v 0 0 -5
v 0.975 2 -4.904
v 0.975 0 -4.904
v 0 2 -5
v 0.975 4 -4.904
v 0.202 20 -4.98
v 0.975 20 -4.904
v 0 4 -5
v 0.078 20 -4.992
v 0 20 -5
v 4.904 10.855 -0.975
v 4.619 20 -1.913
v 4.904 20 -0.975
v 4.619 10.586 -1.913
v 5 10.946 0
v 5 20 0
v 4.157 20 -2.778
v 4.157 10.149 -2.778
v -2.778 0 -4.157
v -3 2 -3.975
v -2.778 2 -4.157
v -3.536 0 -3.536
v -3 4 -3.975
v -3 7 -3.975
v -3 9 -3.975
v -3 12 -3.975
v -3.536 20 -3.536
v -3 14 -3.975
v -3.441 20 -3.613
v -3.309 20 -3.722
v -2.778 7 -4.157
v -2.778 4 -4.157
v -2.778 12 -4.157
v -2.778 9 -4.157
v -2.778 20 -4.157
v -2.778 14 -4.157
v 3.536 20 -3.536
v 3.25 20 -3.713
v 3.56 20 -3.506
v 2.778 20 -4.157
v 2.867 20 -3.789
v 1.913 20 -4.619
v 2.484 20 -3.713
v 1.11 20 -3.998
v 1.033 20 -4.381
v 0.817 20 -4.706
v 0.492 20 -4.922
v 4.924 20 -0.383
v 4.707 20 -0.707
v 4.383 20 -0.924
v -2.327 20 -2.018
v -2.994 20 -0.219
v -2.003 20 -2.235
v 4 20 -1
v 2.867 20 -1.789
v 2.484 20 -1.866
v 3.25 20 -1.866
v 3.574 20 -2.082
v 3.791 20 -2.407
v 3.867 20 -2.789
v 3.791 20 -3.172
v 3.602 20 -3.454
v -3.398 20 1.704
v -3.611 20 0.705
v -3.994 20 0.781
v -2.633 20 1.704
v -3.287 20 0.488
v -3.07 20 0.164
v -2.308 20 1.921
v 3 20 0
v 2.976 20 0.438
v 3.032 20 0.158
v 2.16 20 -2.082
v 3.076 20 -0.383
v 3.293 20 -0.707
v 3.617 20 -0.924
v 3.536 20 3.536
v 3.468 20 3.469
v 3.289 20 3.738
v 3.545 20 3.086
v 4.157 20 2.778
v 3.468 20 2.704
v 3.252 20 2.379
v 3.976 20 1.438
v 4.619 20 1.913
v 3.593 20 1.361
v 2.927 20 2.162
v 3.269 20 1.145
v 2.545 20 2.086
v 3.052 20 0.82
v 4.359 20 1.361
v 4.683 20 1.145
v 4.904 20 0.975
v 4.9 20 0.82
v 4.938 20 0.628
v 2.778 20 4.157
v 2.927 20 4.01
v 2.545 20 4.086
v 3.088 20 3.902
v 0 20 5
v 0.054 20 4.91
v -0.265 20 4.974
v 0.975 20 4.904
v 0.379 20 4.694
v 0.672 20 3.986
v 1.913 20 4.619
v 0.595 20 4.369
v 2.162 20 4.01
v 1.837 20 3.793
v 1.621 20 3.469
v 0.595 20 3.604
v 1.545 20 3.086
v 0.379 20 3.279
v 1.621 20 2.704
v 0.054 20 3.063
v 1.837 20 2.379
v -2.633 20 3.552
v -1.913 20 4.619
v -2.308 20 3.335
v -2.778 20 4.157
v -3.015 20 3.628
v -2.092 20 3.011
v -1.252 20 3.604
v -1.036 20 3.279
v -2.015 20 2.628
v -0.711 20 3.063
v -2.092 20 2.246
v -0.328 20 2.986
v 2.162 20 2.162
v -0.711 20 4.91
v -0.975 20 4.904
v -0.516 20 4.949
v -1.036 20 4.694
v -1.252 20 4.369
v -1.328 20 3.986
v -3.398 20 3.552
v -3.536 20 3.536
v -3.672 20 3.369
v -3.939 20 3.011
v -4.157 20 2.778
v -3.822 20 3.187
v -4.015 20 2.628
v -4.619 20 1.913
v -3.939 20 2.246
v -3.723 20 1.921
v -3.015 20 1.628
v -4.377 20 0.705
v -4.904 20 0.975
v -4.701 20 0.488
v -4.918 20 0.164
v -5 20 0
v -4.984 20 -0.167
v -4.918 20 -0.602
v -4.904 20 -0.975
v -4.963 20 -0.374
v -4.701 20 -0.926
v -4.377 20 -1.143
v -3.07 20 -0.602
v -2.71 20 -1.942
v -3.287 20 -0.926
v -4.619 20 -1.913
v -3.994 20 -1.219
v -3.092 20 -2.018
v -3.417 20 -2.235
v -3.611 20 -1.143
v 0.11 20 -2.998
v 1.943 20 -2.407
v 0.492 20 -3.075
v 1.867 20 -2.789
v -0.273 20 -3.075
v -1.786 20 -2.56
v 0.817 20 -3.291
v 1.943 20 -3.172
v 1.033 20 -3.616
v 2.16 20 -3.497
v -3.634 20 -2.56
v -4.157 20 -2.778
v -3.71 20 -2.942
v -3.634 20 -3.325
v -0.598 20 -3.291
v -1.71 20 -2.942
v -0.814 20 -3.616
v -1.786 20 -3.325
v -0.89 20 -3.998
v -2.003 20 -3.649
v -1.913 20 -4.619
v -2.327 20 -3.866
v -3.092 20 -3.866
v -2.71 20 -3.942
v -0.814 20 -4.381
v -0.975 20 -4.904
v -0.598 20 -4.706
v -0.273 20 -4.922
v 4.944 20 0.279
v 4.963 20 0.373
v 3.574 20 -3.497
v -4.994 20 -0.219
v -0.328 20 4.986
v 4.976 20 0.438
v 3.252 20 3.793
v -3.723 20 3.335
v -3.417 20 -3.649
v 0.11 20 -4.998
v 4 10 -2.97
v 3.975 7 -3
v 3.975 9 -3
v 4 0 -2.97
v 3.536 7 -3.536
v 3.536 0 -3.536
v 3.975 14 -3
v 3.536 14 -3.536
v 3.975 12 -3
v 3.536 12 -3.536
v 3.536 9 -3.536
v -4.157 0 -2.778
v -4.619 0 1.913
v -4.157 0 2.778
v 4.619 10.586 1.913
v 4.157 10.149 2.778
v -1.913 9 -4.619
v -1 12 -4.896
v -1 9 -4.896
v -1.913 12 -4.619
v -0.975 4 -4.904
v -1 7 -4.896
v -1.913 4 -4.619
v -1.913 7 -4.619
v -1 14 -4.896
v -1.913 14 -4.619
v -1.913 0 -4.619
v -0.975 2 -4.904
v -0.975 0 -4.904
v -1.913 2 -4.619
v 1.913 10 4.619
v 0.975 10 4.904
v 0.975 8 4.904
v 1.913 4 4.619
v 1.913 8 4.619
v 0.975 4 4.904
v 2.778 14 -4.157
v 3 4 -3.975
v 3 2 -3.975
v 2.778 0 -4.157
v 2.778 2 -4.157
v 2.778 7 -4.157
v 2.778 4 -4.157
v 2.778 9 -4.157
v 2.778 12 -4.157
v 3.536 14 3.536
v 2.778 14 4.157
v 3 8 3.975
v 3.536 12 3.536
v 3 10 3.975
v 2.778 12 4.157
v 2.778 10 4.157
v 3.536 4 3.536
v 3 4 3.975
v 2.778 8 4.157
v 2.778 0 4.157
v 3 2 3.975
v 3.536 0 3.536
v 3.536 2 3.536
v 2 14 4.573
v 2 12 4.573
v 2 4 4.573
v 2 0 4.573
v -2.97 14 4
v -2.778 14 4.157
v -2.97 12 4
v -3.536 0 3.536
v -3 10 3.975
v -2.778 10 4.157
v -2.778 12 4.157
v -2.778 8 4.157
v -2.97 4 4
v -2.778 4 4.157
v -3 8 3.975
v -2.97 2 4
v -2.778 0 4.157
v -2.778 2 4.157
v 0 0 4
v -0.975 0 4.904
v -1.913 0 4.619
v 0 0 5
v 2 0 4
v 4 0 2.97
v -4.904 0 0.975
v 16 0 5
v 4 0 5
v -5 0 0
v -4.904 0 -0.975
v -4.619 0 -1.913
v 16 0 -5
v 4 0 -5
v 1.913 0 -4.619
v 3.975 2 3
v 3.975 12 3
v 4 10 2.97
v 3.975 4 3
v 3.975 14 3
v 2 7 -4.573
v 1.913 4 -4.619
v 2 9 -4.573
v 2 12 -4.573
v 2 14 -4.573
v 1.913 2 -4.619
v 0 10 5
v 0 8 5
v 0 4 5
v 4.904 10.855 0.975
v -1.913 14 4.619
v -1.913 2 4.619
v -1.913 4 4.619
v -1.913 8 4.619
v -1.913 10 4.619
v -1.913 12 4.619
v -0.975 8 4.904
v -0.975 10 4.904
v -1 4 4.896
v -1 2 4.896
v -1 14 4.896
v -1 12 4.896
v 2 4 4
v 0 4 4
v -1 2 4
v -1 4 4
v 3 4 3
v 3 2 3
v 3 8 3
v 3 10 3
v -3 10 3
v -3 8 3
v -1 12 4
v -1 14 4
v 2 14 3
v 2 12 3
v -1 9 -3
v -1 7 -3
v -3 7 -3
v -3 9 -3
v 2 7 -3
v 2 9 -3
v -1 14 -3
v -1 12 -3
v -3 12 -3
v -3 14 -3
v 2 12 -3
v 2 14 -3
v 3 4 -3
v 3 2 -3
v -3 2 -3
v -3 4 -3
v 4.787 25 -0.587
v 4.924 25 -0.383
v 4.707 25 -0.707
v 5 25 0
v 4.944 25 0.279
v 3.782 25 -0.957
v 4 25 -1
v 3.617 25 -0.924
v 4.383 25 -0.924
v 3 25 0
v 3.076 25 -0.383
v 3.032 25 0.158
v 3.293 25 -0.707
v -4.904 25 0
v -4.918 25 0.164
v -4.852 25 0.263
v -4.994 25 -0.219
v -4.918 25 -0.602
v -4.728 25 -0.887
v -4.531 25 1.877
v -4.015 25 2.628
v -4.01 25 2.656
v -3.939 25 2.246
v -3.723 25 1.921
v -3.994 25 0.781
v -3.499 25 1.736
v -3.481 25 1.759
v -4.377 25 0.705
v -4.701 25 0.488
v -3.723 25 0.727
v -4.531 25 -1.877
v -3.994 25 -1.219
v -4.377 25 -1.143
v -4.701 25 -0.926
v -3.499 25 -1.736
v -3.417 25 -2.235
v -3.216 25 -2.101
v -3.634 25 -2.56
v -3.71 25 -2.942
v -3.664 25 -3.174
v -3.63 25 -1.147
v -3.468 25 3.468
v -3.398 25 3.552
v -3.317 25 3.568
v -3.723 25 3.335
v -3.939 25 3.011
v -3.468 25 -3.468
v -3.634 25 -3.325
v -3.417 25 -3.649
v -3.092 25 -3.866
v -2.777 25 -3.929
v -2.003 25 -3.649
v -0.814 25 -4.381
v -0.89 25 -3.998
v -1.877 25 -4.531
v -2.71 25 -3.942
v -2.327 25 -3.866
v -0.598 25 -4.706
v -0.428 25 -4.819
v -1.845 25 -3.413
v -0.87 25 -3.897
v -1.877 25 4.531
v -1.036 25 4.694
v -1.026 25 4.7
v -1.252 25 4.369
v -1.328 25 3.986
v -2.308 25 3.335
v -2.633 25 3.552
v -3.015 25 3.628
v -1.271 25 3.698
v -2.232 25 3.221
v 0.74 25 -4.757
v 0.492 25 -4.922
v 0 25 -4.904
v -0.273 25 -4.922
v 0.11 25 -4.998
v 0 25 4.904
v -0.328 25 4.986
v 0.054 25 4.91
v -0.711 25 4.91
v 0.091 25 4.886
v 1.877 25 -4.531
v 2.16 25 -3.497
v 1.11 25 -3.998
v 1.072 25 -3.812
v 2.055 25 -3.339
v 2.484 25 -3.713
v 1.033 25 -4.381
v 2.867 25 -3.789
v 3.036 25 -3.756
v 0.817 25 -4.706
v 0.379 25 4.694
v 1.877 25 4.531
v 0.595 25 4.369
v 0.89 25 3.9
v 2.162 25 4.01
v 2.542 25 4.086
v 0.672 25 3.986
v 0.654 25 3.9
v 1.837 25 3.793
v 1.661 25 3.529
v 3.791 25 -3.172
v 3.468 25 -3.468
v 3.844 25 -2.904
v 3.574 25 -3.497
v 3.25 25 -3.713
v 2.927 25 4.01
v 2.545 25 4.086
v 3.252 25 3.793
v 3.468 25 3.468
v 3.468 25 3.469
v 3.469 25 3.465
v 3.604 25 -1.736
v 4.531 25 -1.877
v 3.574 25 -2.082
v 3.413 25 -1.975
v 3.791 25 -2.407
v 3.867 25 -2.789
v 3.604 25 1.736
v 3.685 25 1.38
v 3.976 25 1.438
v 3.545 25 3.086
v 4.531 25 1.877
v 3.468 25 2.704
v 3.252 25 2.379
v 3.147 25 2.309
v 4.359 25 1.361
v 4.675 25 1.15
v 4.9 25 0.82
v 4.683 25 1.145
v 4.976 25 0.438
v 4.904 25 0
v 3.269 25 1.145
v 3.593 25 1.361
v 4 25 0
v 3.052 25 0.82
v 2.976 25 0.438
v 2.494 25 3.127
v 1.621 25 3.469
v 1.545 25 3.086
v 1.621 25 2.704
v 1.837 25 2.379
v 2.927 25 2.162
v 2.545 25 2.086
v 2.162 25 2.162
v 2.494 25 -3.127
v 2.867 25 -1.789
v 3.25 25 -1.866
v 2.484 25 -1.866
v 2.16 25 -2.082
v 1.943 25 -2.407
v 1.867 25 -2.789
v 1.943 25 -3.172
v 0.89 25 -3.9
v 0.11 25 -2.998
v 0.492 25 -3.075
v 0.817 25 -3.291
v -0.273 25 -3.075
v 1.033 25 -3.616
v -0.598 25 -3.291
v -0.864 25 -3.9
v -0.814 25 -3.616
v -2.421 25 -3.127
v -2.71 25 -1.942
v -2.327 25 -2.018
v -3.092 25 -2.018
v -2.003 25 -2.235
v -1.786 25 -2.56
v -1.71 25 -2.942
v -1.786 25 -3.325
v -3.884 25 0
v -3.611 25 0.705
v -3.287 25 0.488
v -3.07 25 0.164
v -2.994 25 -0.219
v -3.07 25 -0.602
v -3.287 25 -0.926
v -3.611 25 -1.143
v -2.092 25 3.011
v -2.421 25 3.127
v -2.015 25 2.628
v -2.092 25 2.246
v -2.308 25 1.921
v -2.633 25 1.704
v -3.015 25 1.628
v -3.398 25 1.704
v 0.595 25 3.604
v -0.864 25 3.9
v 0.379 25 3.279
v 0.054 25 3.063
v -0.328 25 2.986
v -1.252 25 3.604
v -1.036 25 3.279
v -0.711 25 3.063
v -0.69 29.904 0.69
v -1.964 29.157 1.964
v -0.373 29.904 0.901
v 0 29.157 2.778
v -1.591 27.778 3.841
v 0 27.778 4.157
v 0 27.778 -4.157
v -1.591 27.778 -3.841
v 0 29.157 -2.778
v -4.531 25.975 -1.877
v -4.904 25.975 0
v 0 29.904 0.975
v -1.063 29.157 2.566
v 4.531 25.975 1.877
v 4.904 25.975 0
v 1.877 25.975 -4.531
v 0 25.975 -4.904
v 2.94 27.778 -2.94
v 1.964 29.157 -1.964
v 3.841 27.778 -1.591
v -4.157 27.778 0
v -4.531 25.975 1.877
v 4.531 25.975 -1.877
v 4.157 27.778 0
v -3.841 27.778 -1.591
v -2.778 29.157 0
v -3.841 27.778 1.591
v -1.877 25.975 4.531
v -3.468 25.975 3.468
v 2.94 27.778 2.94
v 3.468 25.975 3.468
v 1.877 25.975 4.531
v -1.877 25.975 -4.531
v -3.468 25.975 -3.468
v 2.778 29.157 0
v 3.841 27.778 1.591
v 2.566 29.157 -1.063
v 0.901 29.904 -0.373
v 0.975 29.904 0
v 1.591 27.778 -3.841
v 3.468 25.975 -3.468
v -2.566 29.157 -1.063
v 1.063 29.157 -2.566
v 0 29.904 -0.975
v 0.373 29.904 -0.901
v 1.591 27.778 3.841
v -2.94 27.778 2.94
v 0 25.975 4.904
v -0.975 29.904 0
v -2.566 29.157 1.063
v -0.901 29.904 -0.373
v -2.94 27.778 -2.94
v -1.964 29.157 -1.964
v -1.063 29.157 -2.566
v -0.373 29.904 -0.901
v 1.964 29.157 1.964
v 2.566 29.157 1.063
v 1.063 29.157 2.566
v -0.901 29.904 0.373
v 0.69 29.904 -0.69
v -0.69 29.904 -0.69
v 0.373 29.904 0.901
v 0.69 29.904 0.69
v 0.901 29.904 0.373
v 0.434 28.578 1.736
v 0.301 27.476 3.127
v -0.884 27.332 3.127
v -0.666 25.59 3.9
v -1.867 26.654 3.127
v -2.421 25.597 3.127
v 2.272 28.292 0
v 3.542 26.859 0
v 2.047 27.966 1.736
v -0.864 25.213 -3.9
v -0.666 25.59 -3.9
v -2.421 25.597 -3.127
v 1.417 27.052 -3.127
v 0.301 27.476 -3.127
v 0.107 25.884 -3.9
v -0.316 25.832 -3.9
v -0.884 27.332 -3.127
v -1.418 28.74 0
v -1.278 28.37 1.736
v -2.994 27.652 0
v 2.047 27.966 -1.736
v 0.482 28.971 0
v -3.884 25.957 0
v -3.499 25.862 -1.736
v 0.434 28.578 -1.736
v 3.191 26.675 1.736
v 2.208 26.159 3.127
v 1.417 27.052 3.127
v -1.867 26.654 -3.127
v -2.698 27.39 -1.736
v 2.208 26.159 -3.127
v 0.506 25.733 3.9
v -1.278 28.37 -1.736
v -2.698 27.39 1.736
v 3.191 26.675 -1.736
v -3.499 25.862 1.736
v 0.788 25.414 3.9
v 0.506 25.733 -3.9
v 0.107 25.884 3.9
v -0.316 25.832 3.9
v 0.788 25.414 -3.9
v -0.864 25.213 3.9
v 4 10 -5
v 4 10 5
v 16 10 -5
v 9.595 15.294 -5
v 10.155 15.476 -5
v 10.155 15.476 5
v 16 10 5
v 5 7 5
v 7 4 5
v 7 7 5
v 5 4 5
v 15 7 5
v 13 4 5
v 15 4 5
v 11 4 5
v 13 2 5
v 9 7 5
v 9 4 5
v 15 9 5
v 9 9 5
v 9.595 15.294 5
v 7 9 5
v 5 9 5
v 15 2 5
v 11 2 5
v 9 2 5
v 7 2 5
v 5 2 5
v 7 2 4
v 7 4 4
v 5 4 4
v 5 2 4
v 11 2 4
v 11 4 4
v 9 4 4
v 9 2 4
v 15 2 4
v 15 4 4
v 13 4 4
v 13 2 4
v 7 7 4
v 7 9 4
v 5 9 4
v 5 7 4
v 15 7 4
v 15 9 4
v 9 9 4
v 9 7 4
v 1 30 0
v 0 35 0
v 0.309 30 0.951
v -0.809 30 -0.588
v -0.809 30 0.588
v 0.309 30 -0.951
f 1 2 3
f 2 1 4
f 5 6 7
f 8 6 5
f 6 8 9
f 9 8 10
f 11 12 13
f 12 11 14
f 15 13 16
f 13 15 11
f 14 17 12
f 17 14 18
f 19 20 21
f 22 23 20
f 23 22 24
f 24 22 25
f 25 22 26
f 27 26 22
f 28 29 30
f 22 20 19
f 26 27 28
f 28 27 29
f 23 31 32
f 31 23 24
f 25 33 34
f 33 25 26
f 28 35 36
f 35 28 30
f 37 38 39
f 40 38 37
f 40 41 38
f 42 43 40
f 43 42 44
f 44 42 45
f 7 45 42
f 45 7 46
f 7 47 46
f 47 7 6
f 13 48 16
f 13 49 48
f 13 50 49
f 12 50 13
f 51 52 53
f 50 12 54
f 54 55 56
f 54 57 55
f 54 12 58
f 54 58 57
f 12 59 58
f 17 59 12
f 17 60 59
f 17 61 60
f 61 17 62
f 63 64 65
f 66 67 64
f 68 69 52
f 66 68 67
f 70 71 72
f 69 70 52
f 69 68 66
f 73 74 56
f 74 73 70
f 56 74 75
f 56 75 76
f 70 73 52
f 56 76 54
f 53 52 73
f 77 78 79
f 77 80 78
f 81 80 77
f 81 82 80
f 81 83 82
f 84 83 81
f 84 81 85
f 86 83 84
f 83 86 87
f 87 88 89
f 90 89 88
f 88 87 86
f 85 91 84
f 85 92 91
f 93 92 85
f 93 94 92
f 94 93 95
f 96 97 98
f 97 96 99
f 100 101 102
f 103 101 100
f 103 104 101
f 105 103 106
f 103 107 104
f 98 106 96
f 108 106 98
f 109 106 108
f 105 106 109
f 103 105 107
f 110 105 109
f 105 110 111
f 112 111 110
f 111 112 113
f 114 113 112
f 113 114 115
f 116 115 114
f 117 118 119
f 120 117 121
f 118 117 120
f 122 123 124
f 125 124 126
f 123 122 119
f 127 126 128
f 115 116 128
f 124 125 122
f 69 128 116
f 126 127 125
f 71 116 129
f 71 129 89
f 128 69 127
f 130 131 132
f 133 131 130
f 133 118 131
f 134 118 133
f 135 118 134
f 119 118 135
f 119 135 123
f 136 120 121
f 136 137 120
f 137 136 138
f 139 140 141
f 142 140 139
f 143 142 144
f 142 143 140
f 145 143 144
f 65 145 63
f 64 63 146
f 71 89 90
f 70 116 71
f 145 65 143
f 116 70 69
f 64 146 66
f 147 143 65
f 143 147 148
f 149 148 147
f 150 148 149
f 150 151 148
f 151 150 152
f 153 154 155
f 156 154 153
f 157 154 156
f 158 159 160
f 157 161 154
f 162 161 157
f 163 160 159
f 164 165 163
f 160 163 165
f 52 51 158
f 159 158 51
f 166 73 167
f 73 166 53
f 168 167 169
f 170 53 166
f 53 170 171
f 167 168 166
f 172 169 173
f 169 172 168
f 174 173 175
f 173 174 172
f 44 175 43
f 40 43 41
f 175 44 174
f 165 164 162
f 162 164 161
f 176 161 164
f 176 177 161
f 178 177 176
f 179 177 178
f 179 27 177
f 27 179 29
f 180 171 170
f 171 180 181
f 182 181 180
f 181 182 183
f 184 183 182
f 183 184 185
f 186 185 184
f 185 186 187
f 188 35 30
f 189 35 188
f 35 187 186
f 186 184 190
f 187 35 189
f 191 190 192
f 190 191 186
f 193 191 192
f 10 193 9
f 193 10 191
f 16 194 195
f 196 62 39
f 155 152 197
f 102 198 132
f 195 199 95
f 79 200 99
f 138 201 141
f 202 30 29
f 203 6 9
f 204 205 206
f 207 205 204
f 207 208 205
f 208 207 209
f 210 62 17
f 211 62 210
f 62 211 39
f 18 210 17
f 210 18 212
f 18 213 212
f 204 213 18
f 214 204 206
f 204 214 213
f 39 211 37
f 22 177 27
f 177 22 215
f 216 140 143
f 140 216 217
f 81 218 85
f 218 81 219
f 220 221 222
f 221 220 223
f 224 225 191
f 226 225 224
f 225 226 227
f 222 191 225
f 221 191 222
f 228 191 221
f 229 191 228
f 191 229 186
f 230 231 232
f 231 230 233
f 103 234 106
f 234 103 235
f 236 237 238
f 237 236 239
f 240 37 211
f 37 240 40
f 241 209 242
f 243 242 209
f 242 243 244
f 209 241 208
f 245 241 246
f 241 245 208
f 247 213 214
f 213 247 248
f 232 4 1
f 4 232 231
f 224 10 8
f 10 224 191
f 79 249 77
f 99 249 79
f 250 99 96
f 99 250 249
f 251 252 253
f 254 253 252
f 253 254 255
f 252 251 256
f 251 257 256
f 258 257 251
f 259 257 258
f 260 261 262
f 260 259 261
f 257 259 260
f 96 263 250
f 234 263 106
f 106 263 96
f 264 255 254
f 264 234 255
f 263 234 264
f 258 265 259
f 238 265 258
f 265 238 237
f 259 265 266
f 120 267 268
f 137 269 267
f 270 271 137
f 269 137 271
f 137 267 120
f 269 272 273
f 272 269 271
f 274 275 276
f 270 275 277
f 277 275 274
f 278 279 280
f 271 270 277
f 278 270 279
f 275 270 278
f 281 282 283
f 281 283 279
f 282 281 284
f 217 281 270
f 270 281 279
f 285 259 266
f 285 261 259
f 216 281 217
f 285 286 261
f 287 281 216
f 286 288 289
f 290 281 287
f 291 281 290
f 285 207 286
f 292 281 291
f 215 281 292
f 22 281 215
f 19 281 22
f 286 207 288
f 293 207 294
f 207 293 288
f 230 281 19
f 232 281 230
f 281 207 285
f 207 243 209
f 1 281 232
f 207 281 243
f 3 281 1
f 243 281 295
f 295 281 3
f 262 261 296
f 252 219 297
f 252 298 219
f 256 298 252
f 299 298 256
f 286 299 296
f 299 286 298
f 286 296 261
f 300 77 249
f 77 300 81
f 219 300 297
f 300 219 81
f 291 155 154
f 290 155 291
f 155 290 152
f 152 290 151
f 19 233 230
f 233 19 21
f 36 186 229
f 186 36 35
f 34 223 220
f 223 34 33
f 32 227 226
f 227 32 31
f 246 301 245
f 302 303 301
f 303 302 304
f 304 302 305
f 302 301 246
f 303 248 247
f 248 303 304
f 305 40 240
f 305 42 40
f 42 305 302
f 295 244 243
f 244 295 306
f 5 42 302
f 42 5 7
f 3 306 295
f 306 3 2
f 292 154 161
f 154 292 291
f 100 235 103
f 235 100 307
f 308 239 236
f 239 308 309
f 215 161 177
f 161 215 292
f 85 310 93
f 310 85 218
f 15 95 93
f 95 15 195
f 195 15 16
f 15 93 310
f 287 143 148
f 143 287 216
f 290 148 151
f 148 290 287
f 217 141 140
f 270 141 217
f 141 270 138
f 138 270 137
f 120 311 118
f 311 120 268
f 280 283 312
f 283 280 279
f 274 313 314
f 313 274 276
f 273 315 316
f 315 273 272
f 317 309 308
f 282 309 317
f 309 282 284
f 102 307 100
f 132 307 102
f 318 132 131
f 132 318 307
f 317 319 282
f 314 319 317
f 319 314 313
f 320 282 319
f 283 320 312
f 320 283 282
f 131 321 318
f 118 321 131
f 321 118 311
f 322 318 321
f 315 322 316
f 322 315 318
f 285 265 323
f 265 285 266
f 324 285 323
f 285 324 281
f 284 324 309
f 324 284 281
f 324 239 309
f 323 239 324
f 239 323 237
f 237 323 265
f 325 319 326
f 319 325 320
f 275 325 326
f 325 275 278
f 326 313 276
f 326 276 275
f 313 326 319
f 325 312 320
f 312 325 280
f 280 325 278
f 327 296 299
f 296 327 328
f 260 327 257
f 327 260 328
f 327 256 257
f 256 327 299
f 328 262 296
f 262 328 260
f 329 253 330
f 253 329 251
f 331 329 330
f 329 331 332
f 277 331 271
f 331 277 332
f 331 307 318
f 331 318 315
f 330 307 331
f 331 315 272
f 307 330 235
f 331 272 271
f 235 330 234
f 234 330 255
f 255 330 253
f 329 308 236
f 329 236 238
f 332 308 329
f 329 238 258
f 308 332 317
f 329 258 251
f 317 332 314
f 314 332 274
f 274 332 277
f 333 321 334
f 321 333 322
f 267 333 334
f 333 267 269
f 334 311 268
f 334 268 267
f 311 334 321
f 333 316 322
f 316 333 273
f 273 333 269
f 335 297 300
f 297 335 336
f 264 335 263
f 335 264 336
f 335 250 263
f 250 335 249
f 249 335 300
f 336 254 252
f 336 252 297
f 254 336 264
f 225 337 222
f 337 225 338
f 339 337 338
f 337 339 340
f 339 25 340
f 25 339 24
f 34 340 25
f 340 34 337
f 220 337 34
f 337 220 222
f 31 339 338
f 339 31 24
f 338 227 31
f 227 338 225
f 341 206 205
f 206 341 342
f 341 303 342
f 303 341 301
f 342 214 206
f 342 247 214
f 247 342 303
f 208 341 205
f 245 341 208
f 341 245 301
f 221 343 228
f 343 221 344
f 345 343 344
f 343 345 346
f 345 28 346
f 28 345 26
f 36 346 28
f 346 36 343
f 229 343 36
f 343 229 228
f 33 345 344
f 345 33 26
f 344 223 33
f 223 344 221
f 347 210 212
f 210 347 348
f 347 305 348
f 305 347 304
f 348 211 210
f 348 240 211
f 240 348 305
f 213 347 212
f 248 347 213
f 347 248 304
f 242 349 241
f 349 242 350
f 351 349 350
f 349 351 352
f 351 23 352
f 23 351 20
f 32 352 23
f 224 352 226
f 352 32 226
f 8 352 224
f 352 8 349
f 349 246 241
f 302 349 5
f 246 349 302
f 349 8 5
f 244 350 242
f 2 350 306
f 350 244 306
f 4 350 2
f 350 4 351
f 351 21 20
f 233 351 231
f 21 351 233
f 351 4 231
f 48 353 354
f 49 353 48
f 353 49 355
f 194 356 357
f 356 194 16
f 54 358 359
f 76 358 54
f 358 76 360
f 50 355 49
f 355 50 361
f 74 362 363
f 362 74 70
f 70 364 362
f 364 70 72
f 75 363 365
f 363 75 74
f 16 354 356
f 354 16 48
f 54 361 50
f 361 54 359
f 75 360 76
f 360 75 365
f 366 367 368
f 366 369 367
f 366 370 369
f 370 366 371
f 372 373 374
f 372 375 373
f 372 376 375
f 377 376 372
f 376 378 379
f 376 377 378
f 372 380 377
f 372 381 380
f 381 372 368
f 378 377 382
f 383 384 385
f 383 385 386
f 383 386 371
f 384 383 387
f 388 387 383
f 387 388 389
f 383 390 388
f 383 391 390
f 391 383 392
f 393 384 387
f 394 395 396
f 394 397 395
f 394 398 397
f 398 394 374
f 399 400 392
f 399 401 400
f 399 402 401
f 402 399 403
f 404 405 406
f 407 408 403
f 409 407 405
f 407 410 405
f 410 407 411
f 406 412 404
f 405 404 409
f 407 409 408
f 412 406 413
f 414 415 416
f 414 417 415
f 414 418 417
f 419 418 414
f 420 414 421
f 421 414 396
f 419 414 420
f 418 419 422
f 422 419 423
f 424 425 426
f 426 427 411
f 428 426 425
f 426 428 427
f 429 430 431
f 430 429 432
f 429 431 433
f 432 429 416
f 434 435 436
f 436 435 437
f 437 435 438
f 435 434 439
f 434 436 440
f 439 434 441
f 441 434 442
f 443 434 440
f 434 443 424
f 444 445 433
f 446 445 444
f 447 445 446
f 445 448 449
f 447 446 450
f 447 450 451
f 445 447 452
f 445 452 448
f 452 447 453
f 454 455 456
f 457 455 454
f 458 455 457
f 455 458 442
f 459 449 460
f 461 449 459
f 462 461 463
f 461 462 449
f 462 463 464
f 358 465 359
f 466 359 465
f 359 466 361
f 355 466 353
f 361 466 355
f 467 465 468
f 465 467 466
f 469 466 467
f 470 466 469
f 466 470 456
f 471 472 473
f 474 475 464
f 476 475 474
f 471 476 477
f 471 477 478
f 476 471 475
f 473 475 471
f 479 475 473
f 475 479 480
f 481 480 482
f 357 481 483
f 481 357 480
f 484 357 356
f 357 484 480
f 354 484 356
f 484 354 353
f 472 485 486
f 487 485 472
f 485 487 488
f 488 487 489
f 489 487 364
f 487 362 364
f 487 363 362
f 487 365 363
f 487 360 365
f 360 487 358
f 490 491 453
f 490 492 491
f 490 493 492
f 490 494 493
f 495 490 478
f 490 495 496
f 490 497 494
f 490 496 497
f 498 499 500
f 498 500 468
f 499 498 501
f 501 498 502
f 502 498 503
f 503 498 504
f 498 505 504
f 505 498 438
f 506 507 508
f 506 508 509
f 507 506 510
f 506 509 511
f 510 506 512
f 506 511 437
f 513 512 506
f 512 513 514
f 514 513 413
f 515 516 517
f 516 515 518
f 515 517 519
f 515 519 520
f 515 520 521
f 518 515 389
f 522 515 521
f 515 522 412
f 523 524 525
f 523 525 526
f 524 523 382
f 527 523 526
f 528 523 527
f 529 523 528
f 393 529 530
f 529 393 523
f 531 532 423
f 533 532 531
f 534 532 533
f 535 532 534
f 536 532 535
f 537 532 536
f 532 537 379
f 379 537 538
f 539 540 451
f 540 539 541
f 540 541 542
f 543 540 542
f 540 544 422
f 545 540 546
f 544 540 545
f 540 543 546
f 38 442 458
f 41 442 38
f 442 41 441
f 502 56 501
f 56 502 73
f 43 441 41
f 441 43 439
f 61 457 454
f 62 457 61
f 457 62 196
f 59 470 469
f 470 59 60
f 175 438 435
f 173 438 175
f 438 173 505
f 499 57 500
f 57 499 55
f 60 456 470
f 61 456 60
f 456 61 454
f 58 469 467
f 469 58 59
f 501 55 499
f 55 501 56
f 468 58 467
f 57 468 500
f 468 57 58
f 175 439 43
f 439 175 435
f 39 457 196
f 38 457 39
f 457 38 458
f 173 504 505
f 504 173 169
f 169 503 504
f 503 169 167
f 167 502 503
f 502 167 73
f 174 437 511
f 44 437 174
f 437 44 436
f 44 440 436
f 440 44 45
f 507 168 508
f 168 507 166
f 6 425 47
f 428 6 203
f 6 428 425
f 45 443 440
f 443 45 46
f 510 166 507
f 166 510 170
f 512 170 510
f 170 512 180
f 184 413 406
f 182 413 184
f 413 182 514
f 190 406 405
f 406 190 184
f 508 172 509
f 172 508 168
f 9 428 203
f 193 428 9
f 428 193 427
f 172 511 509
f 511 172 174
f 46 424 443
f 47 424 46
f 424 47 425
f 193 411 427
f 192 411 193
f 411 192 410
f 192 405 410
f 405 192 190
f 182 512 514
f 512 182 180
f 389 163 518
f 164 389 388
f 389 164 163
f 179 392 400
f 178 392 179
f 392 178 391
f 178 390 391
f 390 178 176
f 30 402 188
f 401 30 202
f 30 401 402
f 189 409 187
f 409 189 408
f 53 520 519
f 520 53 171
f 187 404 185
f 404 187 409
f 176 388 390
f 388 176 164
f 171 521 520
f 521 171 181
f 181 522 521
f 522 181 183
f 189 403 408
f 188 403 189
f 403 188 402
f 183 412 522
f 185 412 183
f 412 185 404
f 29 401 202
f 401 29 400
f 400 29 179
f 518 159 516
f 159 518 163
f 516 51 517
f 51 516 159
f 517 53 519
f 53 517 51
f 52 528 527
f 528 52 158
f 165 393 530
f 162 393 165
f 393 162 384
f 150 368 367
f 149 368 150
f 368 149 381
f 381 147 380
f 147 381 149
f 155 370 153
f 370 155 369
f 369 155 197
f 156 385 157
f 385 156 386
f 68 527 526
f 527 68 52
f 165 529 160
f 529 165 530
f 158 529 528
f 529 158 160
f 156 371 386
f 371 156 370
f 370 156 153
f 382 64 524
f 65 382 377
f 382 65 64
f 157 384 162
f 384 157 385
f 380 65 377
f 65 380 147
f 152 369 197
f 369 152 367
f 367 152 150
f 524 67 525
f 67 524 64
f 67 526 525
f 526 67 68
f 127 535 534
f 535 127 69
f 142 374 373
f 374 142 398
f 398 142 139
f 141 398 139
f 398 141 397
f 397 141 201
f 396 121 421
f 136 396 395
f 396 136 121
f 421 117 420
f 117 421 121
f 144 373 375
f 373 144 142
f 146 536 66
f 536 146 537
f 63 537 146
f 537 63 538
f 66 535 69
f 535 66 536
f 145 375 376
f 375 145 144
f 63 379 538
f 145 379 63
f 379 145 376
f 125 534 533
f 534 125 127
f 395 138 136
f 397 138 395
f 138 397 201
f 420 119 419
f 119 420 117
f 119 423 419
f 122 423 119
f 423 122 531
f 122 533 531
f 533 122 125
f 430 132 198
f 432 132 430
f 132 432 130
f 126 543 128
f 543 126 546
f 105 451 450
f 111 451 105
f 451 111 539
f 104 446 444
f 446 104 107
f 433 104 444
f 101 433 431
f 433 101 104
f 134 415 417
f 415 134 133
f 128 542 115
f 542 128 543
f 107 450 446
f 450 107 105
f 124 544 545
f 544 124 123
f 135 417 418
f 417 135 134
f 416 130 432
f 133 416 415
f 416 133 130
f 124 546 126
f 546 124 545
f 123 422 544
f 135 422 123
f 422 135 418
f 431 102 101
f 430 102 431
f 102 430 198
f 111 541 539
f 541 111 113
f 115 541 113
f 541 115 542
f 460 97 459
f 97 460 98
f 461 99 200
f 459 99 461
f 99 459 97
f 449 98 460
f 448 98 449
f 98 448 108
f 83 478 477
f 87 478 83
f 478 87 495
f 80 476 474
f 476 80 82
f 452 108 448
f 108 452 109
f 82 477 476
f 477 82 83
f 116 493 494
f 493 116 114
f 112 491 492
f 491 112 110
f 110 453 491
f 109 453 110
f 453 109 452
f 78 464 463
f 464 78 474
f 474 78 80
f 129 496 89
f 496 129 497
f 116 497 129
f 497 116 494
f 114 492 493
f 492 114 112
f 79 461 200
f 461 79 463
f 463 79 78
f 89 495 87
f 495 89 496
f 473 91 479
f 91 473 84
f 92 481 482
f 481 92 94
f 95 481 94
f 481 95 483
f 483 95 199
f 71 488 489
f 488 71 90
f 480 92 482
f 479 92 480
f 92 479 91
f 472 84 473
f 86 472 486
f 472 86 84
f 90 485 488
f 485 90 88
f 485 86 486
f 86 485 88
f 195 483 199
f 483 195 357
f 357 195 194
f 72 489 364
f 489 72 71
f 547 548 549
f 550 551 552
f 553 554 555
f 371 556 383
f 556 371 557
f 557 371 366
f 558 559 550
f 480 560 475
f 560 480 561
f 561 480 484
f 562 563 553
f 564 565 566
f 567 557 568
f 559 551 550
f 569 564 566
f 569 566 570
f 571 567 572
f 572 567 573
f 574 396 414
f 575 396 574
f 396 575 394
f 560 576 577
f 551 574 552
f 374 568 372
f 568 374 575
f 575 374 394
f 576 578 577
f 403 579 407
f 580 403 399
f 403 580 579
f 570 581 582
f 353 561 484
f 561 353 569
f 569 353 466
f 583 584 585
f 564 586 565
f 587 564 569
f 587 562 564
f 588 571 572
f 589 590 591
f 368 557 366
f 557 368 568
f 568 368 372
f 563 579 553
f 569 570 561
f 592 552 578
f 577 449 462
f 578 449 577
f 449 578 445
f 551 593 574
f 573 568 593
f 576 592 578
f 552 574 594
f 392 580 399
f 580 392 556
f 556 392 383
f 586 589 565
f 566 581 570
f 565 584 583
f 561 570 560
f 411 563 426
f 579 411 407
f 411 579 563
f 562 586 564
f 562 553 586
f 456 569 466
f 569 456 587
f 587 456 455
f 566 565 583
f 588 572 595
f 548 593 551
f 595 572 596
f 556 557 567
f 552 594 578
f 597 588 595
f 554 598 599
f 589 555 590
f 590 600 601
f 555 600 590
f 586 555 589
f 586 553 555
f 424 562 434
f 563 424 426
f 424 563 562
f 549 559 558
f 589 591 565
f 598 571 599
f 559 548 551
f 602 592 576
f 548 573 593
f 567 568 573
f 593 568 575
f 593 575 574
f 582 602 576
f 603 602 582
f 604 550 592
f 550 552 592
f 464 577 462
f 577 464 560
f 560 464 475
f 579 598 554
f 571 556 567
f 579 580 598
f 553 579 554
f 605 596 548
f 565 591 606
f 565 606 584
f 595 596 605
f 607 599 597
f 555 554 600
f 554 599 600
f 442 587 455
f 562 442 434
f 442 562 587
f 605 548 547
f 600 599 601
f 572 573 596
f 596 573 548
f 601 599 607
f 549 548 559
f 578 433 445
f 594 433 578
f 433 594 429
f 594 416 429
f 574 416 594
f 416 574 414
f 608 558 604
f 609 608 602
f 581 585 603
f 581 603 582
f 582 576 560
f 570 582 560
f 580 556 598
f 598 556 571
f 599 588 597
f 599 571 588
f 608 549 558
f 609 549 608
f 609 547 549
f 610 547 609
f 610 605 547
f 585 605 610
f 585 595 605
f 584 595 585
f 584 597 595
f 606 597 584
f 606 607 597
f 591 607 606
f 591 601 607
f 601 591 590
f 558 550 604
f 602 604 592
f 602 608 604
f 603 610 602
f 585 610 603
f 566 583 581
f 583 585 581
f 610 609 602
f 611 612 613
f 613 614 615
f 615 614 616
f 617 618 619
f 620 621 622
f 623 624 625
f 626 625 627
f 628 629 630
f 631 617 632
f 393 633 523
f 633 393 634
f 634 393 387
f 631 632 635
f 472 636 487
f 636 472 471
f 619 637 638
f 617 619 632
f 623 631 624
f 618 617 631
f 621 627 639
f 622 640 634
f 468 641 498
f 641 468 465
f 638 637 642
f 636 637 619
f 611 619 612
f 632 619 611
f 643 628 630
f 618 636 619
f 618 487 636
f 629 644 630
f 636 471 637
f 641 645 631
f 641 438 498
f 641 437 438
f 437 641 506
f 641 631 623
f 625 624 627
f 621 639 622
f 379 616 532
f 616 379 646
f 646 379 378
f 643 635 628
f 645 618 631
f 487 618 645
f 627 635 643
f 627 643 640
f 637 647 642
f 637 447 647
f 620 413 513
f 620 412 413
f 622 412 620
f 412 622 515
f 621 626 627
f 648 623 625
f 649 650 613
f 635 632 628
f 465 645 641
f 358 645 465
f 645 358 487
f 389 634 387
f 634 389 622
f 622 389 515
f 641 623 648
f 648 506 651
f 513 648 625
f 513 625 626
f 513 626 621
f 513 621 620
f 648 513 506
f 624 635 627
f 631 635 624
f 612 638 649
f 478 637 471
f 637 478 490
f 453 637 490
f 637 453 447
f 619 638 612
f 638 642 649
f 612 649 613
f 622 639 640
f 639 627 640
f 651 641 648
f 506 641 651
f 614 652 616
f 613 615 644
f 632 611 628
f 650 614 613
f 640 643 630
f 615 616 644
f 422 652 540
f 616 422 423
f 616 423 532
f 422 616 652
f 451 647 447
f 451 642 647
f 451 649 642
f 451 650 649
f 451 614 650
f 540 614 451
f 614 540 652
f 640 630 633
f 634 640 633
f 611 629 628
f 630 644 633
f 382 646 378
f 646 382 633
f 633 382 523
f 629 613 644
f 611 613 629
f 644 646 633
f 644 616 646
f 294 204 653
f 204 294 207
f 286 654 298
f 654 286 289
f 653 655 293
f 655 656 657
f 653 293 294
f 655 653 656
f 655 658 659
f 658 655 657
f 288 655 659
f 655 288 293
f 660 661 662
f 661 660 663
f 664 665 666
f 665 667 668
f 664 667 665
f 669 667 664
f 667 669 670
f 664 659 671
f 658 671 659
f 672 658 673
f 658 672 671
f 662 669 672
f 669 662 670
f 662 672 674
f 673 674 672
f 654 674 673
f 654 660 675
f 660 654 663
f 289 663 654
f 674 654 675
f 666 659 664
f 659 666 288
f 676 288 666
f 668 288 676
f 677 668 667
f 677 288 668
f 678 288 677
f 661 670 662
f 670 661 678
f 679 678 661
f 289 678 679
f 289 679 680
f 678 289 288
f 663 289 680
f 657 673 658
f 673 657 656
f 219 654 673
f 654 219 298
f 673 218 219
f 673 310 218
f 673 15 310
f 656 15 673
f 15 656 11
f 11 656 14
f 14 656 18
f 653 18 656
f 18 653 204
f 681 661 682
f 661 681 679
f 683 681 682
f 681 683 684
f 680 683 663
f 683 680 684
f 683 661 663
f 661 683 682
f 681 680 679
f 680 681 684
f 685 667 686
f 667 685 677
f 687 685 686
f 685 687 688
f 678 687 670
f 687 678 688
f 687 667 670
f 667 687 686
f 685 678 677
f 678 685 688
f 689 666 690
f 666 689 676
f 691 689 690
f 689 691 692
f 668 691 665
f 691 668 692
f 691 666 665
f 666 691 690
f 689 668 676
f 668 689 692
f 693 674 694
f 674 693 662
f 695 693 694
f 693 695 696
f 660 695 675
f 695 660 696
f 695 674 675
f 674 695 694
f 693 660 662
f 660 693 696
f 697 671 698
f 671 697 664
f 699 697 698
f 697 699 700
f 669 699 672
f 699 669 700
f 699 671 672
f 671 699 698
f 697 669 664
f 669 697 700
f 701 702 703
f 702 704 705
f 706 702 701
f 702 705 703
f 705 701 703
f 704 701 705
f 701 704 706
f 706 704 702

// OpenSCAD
union() {

	difference() {
		rotate(-90,[1,0,0]) cylinder(r=5,h=20,$fn=32);
	
		// Door
		translate([0,-1,4]) cube([2,5,2]);
	
		// Bottom windows
		translate([-3,2,4]) cube([2,2,2]);
		translate([+3,2,3]) cube([2,2,2]);
	
		// Middle wide window
		translate([-3,8,3]) cube([6,2,2]);
	
		// Top windows
		translate([-3,12,4]) cube([2,2,2]);
		translate([+2,12,3]) cube([2,2,2]);
	
		// Back Bottom windows
		translate([-3,7,-5]) cube([2,2,2]);
		translate([+2,7,-5]) cube([2,2,2]);
	
		// Back Top windows
		translate([-3,12,-5]) cube([2,2,2]);
		translate([+2,12,-5]) cube([2,2,2]);
	
		// Back wide window
		translate([-3,2,-5]) cube([6,2,2]);
	}

	// Columns
	for( r=[0:8] ) {
		assign( t=r/8*3.14*2 ) {
			translate( [0,25,0] )
			rotate( r/8*360, [0,1,0] )
			translate( [4*cos(t),0,4*sin(t)] )
			rotate( 90, [1,0,0] )
			cylinder( r=1, h=5, $fn=16 );
		}
	}

	// Dome
	difference() {
		translate( [0,25,0] )
		rotate( 90, [1,0,0] )
		difference() {
			sphere( r=5 );
			cylinder( r=10, h=10 );
		}

		translate( [0,25,0] )
		sphere( r=4 );
	}

	// Peak
	translate( [0,35,0] )
	rotate( 90, [1,0,0] )
	cylinder( r1=0, r2=1, h=5 );

	translate( [-1,0,0] )
	difference() {
		// Right building	
		hull() {
			translate([5,0,-5]) cube([12,10,10]);
	
			// Peak
			translate( [11,15,-5] )
			cylinder( r=0.5, h=10 );
		}
	
		// Right bottom windows
		translate([+06,2,4]) cube([2,2,2]);
		translate([+10,2,4]) cube([2,2,2]);
		translate([+14,2,4]) cube([2,2,2]);

		// Right top windows
		translate([+06,7,4]) cube([2,2,2]);
		translate([+10,7,4]) cube([6,2,2]);


	}
}
